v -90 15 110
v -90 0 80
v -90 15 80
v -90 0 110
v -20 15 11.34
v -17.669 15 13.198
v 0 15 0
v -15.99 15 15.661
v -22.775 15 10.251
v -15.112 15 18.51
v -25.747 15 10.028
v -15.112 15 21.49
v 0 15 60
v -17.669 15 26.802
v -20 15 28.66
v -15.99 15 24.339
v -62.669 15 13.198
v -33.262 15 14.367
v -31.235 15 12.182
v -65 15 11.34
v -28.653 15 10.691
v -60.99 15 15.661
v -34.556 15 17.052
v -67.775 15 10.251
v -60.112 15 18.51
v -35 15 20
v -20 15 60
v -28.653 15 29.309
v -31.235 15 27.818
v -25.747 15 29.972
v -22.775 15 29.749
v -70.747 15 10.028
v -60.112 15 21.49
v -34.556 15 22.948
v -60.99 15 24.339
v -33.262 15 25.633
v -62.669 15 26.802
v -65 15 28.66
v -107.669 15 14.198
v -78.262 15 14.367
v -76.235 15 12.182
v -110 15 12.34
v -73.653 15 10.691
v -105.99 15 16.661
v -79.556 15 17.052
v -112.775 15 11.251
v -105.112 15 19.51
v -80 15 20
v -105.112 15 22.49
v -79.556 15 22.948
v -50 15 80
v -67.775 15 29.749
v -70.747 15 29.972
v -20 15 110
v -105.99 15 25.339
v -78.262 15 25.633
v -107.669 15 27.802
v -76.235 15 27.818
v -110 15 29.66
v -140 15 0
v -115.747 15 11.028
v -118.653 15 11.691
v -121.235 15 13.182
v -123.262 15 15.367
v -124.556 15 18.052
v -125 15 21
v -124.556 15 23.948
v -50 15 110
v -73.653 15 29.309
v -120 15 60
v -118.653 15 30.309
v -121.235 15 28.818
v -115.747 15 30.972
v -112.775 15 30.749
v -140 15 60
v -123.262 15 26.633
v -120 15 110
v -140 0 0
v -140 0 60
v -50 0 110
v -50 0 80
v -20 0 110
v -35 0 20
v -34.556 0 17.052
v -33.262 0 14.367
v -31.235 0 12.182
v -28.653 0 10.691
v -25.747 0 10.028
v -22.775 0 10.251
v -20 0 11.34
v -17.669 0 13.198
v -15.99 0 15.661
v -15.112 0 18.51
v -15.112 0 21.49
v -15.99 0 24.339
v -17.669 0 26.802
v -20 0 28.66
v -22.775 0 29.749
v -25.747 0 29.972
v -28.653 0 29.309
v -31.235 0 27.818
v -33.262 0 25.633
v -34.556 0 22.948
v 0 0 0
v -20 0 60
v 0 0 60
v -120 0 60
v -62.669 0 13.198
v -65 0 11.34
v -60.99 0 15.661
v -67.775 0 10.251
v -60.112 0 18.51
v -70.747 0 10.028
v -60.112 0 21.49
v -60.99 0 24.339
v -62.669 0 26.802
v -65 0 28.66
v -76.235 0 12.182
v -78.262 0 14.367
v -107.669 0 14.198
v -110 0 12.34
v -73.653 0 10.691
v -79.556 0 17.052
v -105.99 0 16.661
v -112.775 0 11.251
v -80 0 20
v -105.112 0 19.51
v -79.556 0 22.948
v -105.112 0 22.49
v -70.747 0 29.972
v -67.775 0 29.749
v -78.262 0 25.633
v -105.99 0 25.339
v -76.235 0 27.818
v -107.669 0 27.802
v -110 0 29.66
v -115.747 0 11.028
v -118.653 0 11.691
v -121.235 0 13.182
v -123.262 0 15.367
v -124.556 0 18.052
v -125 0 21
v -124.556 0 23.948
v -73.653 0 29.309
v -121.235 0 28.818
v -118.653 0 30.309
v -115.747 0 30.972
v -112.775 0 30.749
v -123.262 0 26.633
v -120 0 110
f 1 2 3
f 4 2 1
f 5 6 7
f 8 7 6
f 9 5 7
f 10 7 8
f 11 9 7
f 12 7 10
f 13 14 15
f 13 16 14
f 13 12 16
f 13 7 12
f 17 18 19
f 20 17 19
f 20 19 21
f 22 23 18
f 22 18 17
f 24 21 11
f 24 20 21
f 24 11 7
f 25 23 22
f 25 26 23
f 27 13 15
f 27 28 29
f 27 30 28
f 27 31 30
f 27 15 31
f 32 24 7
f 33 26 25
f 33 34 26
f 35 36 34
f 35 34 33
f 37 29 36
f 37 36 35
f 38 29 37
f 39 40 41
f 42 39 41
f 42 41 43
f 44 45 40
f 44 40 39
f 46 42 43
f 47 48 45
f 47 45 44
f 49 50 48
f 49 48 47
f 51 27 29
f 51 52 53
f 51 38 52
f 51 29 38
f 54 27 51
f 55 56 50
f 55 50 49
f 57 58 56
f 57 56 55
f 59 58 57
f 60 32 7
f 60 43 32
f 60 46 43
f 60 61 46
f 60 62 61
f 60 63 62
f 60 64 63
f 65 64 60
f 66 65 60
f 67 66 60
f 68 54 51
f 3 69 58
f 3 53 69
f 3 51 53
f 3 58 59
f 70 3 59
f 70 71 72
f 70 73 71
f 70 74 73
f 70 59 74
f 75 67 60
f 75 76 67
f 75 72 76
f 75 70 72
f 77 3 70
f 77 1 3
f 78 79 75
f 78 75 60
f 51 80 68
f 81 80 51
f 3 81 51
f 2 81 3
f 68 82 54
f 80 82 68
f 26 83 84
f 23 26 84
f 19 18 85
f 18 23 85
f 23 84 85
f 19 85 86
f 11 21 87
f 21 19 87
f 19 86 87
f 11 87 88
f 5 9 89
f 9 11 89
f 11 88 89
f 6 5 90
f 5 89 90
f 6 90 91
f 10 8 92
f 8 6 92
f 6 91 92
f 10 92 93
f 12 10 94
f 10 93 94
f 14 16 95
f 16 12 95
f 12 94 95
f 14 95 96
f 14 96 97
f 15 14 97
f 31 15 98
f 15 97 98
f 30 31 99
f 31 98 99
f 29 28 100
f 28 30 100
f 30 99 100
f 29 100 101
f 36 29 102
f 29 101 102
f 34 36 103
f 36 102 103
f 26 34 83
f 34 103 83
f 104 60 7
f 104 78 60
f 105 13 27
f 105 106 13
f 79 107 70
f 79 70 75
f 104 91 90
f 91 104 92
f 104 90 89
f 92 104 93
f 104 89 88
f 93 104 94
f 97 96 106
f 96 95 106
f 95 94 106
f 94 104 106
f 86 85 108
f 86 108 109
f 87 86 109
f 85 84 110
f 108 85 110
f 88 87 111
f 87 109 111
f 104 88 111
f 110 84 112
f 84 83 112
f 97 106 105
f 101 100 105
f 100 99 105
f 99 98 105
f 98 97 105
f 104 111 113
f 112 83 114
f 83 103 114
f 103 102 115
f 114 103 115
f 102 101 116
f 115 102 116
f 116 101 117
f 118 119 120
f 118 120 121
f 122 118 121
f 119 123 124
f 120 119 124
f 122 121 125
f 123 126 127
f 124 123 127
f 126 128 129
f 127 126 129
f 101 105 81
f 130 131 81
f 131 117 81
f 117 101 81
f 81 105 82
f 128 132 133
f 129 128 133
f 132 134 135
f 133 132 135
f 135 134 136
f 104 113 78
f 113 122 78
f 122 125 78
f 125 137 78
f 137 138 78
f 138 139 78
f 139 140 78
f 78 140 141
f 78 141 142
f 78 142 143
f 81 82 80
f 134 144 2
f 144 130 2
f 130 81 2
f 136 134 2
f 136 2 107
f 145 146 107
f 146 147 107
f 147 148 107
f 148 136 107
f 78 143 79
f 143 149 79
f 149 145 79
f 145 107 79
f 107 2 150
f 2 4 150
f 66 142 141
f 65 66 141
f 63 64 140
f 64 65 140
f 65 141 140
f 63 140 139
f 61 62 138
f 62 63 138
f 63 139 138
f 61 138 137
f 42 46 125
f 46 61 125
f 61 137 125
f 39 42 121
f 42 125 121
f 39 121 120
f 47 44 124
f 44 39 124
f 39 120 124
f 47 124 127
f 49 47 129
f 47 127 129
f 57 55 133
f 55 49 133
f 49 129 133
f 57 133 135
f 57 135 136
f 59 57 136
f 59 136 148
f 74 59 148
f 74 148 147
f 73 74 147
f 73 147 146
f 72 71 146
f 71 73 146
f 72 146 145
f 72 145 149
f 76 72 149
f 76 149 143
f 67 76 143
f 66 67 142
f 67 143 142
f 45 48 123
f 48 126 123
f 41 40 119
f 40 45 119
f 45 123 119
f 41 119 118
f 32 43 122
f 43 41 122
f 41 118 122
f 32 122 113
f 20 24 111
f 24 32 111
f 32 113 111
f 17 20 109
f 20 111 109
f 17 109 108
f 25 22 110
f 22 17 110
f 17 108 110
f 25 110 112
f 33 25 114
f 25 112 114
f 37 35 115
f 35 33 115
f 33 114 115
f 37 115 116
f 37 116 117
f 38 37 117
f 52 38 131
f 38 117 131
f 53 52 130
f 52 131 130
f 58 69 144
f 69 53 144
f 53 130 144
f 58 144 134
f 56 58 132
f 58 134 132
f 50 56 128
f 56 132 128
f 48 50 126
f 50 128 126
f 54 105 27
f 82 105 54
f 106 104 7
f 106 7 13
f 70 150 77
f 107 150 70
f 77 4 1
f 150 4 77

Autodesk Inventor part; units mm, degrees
ref_plane "YZ Plane" through (0, 0, 0) normal (1, 0, 0) x (0, 1, 0)
ref_plane "XZ Plane" through (0, 0, 0) normal (0, 1, 0) x (-1, 0, 0)
ref_plane "XY Plane" through (0, 0, 0) normal (0, 0, 1) x (1, 0, 0)
sketch "Sketch1" plane through (0, 0, 0) normal (0, 1, 0) x (-1, 0, 0)
  line L0 (0, 0) -> (0, 60)
  line L1 (0, 60) -> (20, 60)
  line L2 (20, 60) -> (20, 110)
  line L3 (20, 110) -> (50, 110)
  line L4 (50, 110) -> (50, 80)
  line L5 (50, 80) -> (90, 80)
  line L6 (90, 80) -> (90, 110)
  line L7 (90, 110) -> (120, 110)
  line L8 (120, 110) -> (120, 60)
  line L9 (120, 60) -> (140, 60)
  line L10 (140, 60) -> (140, 0)
  line L11 (140, 0) -> (0, 0)
  circle A0 centre (25, 20) radius 10
  circle A1 centre (70, 20) radius 10
  circle A2 centre (115, 21) radius 10
  dimension "d0" = 50
  dimension "d1" = 20
  dimension "d2" = 20
  dimension "d5" = 20
extrude "Extrusion1" add sketch "Sketch1" along normal blind 15
properties part number "P1-6"
